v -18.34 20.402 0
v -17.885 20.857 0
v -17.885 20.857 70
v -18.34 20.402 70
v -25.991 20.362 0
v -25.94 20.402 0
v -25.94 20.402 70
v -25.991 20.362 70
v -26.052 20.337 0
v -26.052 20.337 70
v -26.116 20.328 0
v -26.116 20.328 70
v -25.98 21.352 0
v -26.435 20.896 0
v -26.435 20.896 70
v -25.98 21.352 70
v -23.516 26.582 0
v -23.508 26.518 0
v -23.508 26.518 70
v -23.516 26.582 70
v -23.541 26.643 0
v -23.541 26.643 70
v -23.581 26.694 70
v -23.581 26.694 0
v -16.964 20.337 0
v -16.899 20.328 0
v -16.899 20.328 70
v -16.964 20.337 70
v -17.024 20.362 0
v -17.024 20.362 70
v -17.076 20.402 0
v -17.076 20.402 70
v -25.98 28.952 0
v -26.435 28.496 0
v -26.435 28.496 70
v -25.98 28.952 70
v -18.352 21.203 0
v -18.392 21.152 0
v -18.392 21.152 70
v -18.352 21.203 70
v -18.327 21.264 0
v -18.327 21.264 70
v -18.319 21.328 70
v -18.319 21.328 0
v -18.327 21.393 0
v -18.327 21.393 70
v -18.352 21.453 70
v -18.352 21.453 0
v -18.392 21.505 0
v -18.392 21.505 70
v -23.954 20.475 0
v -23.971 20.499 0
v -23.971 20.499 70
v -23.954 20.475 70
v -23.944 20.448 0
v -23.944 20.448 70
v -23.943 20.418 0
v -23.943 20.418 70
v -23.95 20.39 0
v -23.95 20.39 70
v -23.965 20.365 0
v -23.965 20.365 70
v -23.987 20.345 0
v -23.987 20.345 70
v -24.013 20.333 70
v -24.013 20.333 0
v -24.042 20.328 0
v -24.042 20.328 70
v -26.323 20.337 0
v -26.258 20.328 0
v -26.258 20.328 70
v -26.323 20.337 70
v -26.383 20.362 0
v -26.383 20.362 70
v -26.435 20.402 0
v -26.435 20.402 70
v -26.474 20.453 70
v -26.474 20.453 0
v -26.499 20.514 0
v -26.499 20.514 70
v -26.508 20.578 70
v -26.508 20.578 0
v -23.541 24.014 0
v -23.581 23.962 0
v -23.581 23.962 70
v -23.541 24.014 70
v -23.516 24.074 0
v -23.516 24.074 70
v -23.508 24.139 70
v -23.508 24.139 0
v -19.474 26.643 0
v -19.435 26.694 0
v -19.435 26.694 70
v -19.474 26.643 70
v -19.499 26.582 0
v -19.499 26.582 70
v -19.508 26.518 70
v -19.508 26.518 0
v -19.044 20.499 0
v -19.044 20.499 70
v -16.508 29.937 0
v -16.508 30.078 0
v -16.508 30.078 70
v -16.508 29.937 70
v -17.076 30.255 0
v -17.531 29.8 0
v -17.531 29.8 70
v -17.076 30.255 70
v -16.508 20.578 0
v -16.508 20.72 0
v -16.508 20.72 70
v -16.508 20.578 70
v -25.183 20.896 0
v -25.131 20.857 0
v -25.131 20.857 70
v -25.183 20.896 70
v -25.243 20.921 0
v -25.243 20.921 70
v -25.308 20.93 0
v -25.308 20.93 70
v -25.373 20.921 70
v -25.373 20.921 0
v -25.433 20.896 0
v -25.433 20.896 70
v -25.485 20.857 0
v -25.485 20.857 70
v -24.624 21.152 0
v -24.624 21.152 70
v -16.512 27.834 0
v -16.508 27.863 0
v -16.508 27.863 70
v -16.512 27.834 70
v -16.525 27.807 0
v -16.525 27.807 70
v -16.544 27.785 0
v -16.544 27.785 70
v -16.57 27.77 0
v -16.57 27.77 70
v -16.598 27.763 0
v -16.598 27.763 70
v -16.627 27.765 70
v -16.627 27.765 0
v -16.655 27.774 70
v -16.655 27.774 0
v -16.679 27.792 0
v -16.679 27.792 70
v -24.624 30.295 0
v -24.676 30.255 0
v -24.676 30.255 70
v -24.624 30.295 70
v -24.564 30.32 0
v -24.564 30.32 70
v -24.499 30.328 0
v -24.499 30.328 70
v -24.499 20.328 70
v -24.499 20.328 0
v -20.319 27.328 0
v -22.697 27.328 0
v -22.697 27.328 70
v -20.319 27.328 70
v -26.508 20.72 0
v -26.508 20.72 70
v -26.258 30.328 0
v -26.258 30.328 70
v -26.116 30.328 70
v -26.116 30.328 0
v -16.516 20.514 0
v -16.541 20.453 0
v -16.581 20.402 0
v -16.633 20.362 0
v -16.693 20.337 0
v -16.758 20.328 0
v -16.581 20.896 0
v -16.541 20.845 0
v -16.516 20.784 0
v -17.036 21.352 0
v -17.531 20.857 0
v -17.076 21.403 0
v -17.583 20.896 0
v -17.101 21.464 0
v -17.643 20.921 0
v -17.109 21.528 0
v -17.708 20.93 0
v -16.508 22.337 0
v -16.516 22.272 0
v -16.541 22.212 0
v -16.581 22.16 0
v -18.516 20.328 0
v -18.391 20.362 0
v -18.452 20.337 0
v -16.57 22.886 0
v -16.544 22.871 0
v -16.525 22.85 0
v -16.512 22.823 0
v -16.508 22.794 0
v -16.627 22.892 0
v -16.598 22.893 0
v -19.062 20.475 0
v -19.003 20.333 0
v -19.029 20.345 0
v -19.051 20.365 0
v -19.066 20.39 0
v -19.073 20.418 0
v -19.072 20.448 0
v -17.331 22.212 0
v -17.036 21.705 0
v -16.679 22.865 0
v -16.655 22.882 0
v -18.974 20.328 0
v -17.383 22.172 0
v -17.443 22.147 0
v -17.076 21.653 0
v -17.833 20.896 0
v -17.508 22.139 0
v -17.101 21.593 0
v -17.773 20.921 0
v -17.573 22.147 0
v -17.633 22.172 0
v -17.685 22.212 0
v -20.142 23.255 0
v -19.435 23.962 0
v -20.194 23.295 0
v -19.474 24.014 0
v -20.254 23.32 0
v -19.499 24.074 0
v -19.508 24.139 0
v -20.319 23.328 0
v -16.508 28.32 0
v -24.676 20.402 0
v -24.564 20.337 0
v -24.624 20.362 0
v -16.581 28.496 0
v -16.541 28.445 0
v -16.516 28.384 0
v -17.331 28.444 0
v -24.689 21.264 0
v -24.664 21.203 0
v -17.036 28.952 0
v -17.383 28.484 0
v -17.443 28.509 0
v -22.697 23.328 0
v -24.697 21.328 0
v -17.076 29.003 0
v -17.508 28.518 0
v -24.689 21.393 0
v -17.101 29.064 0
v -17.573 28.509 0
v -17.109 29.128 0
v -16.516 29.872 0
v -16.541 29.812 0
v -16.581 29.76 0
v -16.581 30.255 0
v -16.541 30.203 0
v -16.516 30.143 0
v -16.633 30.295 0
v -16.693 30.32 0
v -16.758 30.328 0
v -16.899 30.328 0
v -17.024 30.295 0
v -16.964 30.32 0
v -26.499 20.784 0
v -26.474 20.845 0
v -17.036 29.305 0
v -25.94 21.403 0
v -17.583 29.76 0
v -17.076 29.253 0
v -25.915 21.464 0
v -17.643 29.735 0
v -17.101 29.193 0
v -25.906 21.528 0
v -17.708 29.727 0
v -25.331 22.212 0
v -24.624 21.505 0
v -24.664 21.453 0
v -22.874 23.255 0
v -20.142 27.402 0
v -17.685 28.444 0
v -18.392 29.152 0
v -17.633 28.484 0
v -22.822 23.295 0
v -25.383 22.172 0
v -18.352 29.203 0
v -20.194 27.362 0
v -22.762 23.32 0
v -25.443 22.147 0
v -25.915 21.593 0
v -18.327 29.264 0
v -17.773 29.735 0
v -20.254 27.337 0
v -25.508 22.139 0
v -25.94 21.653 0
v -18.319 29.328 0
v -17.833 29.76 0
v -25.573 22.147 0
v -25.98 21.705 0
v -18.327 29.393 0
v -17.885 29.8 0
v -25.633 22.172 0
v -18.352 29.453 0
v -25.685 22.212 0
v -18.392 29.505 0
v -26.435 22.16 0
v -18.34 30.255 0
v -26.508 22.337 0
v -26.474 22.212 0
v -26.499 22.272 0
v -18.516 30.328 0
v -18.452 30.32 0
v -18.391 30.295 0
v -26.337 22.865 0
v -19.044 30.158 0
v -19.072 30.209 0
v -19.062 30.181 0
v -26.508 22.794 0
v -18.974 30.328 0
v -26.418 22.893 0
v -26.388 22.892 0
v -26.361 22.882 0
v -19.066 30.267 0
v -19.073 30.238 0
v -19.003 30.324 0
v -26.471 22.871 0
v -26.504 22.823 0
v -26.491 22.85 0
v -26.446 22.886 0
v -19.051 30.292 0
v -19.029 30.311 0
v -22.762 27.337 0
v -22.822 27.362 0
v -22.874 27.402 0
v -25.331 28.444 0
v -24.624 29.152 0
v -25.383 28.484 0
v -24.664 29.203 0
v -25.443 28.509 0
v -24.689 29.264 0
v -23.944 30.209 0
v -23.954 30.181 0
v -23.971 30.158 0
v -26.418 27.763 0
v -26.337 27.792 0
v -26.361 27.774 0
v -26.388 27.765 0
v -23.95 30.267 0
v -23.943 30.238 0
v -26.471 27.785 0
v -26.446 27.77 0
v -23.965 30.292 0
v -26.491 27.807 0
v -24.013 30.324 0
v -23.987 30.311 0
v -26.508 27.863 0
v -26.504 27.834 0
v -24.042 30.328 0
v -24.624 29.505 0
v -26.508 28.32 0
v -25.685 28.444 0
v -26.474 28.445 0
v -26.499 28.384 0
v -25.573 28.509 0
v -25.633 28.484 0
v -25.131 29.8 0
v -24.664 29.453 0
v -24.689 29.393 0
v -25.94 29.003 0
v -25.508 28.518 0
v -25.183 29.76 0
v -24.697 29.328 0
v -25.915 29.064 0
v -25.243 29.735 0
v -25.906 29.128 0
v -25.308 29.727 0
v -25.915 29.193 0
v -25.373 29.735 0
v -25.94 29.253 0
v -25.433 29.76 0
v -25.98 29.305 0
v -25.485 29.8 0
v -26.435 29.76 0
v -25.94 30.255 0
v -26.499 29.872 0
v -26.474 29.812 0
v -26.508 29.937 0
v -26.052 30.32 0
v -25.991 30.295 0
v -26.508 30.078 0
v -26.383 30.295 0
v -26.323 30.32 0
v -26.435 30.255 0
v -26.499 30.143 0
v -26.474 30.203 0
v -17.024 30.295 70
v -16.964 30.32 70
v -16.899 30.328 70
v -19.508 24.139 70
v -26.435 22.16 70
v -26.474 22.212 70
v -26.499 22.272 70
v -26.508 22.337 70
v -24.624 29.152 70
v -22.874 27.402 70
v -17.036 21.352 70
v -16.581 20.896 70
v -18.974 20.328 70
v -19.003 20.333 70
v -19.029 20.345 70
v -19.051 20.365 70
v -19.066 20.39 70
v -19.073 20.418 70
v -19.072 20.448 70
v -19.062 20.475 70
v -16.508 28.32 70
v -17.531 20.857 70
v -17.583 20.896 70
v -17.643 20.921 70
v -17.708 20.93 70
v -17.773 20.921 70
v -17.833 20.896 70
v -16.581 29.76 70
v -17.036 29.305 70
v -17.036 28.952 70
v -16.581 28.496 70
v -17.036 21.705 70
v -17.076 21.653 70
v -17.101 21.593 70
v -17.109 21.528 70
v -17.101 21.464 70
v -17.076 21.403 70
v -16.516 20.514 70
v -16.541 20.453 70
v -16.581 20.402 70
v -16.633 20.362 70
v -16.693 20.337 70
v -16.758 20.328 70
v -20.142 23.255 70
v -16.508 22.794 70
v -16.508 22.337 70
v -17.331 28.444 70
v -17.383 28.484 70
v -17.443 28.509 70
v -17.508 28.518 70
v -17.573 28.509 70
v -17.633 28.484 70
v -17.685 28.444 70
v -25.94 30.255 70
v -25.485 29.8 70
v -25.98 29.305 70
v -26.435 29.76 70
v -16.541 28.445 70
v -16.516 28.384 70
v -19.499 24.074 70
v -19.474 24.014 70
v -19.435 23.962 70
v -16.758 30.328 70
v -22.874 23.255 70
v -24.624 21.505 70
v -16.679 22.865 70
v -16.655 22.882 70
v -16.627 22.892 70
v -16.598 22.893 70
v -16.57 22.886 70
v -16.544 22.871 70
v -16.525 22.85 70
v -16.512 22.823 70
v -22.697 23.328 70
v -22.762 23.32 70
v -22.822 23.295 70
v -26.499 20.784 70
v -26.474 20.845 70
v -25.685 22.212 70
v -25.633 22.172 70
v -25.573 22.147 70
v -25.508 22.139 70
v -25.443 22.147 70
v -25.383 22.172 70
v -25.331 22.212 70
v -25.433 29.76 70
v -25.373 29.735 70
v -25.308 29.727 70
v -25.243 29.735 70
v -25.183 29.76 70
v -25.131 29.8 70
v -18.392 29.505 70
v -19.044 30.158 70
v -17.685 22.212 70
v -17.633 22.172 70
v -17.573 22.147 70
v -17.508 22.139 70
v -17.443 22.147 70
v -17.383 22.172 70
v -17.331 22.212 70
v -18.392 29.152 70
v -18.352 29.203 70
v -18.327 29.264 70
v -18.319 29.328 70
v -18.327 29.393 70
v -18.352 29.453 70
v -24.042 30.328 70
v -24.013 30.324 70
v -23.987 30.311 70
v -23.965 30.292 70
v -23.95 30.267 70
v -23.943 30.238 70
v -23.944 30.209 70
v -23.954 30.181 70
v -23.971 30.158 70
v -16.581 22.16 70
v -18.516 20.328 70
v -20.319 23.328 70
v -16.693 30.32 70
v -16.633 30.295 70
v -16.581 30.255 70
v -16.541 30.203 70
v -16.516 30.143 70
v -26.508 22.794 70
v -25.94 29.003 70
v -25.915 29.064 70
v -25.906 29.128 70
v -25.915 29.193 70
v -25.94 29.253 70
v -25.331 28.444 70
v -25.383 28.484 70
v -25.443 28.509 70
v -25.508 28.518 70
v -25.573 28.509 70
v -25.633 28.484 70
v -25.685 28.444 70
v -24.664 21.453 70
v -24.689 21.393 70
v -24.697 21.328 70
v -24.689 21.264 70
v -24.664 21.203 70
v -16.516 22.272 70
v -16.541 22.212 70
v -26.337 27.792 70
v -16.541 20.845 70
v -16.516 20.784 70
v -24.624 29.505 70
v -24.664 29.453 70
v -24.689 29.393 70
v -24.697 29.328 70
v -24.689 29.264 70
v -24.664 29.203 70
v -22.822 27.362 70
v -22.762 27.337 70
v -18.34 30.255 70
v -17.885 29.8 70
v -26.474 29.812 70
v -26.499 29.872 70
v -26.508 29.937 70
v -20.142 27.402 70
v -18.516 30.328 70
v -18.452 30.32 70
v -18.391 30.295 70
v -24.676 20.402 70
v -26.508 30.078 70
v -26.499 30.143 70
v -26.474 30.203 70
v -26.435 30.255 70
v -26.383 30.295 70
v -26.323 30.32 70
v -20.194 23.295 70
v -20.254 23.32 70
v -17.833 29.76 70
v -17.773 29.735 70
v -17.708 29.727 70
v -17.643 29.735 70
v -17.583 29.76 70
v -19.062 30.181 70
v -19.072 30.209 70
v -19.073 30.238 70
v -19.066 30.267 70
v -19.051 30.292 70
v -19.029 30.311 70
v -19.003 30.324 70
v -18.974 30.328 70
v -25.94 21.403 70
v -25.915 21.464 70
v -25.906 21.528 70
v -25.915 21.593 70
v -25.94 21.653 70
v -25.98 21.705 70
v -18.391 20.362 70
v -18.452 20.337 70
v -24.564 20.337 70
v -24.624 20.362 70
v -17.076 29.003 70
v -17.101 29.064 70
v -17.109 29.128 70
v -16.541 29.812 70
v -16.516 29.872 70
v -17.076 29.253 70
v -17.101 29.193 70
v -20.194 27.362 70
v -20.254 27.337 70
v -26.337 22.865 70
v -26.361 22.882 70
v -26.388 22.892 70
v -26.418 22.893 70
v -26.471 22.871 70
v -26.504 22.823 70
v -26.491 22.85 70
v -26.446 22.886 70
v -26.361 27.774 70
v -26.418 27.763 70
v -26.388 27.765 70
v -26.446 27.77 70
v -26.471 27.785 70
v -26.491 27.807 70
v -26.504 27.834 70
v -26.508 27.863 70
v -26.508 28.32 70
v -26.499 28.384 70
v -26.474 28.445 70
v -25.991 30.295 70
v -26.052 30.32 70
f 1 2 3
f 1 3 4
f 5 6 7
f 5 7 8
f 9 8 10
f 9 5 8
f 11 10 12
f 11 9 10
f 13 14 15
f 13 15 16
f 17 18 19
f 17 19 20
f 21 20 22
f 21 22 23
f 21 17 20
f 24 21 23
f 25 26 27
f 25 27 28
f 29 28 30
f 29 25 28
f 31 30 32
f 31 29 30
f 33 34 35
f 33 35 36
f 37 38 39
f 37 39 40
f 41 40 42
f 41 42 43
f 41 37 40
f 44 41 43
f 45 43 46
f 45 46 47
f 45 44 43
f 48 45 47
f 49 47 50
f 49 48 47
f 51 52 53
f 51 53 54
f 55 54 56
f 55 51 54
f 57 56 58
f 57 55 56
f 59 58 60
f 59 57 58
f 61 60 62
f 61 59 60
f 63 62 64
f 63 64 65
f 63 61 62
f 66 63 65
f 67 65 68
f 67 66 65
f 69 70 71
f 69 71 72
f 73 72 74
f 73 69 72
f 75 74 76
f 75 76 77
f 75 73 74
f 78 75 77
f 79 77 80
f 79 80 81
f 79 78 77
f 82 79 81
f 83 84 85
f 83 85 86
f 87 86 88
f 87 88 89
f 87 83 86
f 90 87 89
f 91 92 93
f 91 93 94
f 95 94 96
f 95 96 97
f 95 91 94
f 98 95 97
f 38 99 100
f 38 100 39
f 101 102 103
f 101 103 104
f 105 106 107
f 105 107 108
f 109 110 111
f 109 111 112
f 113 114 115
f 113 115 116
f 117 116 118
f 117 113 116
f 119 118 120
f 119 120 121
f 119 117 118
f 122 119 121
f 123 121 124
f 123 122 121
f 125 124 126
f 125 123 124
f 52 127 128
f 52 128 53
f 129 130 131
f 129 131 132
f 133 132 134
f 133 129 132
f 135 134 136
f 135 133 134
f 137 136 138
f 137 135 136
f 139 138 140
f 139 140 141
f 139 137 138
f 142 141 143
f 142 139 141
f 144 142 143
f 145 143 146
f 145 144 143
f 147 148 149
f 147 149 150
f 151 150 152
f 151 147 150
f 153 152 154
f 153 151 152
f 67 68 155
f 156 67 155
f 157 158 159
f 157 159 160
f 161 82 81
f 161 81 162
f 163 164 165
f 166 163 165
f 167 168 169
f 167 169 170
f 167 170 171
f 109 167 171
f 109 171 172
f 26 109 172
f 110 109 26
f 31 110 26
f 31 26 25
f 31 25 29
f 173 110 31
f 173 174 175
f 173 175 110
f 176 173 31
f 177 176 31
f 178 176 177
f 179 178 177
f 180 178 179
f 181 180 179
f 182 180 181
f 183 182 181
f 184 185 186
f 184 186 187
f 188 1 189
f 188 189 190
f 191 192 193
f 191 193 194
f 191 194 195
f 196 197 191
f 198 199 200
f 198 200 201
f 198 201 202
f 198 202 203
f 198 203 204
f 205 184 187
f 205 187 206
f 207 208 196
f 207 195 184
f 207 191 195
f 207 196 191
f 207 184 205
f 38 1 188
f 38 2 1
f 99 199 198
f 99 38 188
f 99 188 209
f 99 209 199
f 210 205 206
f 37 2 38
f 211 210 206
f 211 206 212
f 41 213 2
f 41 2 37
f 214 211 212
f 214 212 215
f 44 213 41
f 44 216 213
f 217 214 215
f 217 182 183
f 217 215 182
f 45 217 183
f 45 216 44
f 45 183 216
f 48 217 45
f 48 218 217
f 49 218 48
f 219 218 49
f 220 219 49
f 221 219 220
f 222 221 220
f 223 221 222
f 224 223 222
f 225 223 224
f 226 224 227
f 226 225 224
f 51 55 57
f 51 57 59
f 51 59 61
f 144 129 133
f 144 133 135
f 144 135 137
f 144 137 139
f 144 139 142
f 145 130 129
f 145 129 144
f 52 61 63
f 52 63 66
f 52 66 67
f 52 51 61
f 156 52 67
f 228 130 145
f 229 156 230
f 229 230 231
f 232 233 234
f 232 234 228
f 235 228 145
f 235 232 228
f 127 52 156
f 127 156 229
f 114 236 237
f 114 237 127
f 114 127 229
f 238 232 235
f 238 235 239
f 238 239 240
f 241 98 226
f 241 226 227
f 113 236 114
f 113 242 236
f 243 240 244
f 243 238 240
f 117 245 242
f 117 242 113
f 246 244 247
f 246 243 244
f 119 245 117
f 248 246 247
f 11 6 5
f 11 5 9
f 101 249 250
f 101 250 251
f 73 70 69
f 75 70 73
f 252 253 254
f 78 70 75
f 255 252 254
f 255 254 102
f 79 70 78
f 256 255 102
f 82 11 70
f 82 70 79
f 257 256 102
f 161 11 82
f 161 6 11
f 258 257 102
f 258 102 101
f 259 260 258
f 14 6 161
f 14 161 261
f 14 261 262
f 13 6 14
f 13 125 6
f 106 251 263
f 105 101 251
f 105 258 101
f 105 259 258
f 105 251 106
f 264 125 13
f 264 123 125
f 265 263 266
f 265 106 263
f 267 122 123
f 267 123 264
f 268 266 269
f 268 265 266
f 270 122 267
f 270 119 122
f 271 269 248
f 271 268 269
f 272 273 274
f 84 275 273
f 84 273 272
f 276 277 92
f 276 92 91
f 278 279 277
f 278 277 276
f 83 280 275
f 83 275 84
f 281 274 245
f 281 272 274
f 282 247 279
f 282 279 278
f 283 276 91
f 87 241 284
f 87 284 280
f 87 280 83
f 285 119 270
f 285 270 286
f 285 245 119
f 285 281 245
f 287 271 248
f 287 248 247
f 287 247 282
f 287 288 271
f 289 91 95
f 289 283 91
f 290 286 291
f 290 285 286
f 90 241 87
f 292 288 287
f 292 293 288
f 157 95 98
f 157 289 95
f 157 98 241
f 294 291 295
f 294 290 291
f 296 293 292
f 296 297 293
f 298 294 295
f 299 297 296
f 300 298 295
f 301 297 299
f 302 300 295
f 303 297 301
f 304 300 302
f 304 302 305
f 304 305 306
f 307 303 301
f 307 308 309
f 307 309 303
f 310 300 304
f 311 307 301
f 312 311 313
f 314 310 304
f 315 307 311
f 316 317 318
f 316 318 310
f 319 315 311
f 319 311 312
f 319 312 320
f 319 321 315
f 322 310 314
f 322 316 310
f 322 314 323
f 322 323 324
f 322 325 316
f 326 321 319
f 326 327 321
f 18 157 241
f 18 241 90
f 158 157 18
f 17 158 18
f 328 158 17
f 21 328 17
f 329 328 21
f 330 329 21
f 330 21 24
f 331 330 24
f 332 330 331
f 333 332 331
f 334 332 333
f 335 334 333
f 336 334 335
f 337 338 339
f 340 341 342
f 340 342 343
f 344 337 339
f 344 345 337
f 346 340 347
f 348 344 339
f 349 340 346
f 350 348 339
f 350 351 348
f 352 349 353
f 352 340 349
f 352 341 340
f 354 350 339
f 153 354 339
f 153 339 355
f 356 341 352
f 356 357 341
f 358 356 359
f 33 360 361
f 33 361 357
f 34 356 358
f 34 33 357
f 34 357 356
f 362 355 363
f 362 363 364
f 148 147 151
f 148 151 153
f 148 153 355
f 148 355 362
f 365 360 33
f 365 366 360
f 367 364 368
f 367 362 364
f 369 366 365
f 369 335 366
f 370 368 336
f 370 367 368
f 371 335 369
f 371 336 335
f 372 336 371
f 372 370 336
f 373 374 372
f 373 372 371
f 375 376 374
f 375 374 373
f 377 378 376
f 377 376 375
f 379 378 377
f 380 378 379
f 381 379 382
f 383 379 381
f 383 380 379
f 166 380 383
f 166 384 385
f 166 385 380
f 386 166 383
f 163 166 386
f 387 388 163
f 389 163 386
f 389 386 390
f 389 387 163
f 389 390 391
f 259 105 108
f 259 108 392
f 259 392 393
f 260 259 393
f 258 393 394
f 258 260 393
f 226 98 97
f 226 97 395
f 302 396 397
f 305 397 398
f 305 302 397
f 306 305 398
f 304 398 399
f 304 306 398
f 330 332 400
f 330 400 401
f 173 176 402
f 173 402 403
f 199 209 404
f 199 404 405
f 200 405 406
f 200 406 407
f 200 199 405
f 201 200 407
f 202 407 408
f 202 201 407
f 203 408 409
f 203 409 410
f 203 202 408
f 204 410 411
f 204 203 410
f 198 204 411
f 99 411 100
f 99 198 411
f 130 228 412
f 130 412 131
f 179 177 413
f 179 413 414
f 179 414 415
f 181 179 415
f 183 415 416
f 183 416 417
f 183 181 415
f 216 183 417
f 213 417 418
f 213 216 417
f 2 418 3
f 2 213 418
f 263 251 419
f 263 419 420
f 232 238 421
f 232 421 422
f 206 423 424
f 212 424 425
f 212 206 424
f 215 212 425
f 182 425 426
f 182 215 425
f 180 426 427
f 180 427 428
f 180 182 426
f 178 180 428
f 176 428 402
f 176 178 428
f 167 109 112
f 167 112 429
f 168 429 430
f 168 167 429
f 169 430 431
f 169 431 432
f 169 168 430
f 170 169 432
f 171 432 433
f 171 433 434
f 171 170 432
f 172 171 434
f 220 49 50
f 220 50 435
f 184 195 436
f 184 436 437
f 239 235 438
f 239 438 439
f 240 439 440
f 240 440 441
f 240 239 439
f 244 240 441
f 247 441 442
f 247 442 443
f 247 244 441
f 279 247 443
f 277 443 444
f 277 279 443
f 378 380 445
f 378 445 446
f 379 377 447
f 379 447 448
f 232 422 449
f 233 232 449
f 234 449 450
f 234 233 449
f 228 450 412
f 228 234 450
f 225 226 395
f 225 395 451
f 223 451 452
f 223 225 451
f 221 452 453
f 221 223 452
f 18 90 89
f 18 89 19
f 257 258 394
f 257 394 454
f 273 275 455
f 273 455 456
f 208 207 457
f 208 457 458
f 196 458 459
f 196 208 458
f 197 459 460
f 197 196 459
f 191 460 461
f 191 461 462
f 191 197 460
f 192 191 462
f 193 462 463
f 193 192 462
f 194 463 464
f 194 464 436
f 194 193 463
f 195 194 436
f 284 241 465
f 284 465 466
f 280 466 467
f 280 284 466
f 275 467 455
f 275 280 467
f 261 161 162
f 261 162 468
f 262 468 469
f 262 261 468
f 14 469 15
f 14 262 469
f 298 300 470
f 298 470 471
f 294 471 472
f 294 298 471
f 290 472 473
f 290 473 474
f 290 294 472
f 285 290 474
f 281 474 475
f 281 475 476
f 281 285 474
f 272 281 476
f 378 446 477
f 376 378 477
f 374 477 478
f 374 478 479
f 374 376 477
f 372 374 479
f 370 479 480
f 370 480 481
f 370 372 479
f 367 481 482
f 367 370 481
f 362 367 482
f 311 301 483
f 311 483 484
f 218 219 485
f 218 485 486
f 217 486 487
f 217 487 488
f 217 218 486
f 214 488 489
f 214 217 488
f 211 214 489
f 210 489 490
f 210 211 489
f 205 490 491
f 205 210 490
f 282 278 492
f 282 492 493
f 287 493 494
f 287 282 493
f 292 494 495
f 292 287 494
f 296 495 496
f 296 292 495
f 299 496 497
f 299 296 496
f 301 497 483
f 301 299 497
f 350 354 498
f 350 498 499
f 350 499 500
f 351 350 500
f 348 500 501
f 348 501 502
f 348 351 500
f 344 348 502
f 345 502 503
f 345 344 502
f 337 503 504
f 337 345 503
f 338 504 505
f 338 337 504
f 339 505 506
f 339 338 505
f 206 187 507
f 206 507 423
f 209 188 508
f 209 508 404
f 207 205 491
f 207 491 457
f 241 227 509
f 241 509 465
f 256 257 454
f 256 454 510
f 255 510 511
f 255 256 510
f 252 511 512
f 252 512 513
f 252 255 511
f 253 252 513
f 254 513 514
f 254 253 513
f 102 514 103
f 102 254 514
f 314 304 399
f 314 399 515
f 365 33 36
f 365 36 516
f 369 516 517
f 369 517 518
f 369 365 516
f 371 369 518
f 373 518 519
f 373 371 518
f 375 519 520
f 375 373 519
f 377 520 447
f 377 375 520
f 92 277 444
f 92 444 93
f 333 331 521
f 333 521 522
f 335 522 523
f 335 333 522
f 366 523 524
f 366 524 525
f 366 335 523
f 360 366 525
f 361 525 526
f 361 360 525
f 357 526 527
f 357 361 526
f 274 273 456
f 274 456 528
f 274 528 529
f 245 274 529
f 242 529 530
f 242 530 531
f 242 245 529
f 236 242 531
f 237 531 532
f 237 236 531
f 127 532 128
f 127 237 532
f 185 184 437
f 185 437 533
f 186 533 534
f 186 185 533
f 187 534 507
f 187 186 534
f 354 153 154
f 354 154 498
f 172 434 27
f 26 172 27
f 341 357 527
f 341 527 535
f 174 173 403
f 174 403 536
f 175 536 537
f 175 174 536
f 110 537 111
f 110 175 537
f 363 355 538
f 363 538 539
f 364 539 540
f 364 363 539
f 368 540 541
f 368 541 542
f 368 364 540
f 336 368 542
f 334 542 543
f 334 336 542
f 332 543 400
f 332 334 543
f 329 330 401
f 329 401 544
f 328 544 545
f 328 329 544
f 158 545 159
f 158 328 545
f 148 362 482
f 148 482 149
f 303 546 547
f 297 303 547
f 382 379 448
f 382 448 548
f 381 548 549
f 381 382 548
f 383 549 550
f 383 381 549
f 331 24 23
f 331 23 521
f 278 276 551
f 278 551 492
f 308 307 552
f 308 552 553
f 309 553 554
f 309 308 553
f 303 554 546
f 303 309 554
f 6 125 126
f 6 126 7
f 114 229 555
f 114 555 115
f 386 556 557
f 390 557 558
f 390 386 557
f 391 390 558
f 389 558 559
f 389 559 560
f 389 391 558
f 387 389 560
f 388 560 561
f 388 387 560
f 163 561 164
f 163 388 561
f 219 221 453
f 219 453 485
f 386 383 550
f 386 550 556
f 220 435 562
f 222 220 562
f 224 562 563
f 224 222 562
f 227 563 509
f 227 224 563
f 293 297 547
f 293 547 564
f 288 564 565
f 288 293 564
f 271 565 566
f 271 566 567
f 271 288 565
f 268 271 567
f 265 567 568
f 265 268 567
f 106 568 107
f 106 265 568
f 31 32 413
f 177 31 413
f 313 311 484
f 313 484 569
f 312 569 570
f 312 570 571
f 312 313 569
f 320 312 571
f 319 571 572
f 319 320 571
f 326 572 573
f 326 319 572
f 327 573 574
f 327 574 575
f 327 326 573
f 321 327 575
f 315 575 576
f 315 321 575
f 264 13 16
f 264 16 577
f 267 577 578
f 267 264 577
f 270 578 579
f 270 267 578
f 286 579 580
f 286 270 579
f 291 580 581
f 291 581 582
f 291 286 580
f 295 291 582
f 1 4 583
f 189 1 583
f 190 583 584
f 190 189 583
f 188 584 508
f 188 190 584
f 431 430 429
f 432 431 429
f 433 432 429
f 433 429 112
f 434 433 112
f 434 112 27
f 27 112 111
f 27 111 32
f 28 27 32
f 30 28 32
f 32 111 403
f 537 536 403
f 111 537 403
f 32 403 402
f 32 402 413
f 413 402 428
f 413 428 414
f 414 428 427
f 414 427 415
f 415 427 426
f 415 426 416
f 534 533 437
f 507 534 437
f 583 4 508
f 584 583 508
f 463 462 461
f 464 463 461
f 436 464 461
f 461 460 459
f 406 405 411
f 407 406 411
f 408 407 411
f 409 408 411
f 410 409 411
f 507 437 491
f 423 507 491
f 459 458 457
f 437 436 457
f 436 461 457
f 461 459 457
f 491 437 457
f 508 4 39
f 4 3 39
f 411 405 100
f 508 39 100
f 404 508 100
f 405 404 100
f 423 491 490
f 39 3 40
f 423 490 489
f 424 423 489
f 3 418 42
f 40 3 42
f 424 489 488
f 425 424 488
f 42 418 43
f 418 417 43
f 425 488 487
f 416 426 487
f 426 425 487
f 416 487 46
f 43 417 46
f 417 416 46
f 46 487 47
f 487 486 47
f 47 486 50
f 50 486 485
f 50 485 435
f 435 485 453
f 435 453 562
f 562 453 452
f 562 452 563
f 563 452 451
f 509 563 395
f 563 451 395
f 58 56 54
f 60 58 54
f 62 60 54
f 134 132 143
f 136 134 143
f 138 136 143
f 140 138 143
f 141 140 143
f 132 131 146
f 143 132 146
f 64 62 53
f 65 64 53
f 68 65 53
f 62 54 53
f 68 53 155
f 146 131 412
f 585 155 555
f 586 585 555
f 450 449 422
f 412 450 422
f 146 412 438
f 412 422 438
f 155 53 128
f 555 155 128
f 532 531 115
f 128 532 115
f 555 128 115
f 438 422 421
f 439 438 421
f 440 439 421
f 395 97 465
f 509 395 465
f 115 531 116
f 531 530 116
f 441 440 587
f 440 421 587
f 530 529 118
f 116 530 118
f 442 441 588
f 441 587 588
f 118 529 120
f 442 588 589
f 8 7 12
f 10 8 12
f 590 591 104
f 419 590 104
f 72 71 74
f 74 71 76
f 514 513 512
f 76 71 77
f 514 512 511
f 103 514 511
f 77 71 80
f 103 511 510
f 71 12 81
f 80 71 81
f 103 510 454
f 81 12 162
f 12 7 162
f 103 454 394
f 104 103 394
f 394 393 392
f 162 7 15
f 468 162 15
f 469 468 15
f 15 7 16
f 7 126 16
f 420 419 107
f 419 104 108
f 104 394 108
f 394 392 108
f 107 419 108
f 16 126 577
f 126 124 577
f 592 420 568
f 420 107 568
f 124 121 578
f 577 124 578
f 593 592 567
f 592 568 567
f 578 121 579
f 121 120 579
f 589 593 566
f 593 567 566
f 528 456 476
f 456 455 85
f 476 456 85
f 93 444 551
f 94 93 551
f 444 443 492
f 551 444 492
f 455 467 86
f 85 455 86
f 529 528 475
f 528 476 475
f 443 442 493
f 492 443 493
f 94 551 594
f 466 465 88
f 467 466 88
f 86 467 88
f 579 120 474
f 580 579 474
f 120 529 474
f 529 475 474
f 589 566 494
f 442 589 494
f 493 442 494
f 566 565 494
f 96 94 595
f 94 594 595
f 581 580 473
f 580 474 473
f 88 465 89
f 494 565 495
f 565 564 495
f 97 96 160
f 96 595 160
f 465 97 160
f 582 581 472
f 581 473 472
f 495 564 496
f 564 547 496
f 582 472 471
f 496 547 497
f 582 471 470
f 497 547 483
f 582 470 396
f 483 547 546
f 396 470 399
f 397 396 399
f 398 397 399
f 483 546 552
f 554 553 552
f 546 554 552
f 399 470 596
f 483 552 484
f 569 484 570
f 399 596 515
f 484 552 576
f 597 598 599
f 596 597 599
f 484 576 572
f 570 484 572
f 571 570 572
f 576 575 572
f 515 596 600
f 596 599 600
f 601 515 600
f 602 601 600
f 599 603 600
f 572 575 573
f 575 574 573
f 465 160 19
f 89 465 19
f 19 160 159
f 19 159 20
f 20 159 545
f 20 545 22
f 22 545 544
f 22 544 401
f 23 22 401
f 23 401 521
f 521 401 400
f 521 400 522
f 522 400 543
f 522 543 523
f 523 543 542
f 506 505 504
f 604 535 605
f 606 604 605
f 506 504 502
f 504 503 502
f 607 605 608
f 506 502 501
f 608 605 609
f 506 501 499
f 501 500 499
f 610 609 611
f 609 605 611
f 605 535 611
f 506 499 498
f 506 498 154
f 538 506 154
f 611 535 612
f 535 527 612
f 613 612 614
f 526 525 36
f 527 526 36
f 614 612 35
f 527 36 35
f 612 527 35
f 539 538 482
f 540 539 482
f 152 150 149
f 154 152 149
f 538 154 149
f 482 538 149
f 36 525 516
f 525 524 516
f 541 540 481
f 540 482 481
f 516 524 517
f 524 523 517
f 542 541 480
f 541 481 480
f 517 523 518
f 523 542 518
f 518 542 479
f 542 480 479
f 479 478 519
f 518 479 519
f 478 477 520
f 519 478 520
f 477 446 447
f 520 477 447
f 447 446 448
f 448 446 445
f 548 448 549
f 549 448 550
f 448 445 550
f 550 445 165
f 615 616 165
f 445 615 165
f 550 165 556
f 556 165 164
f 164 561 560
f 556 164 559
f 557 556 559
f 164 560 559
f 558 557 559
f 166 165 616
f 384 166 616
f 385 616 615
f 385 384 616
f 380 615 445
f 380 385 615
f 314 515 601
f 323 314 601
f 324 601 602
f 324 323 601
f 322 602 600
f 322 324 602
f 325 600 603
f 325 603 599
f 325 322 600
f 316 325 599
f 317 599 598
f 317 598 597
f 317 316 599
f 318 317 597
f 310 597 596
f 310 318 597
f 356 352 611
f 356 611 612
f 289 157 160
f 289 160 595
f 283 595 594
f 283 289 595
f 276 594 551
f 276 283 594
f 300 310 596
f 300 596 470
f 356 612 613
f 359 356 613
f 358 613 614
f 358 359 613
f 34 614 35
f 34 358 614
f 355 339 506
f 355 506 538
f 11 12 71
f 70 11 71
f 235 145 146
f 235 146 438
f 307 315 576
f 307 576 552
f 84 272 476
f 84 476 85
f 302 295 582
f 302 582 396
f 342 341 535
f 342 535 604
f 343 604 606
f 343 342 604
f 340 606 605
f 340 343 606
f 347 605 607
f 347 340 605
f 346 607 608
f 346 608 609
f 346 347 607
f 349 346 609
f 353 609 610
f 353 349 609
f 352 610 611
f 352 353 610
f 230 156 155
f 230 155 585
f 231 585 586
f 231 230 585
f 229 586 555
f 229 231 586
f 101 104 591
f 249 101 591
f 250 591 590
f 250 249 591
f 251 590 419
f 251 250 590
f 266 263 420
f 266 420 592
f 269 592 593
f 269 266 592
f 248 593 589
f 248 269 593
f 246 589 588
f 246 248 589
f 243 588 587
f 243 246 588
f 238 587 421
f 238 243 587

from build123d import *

# Parameters (mm, degrees)
BOSS_EXTRUDE1_DEPTH = 70


with BuildPart() as part:
    # Sketch1 → Boss-Extrude1 (new body)
    with BuildSketch(Plane.XY):
        with BuildLine():
            Line((-26.434620061, 28.496491655), (-25.979594809, 28.951516907))
            ThreePointArc((-25.979594809, 28.951516907), (-25.906371503, 29.128293603), (-25.979594808, 29.305070299))
            Line((-25.979594808, 29.305070299), (-26.43462006, 29.760095551))
            ThreePointArc((-26.43462006, 29.760095551), (-26.488813248, 29.841201388), (-26.507843365, 29.936872247))
            Line((-26.507843365, 29.936872247), (-26.507843365, 30.078293605))
            ThreePointArc((-26.507843365, 30.078293605), (-26.43462006, 30.255070299), (-26.257843366, 30.328293604))
            Line((-26.257843366, 30.328293604), (-26.11642201, 30.328293604))
            ThreePointArc((-26.11642201, 30.328293604), (-26.020751153, 30.309263487), (-25.939645316, 30.255070299))
            Line((-25.939645316, 30.255070299), (-25.484620061, 29.800045045))
            ThreePointArc((-25.484620061, 29.800045045), (-25.307843366, 29.72682174), (-25.131066671, 29.800045045))
            Line((-25.131066671, 29.800045045), (-24.676041418, 30.255070298))
            ThreePointArc((-24.676041418, 30.255070298), (-24.594935581, 30.309263487), (-24.499264722, 30.328293604))
            Line((-24.499264722, 30.328293604), (-24.042157942, 30.328293604))
            ThreePointArc((-24.042157942, 30.328293604), (-23.949769989, 30.266561947), (-23.971447265, 30.157582926))
            Line((-23.971447265, 30.157582926), (-24.623959891, 29.505070299))
            ThreePointArc((-24.623959891, 29.505070299), (-24.697183196, 29.328293604), (-24.623959891, 29.15151691))
            Line((-24.623959891, 29.15151691), (-22.873959891, 27.401516909))
            ThreePointArc((-22.873959891, 27.401516909), (-22.792854054, 27.347323722), (-22.697183196, 27.328293605))
            Line((-22.697183196, 27.328293605), (-20.318503539, 27.328293605))
            ThreePointArc((-20.318503539, 27.328293605), (-20.222832681, 27.347323722), (-20.141726844, 27.401516909))
            Line((-20.141726844, 27.401516909), (-18.391726844, 29.15151691))
            ThreePointArc((-18.391726844, 29.15151691), (-18.318503539, 29.328293604), (-18.391726844, 29.505070299))
            Line((-18.391726844, 29.505070299), (-19.04423947, 30.157582926))
            ThreePointArc((-19.04423947, 30.157582926), (-19.065916745, 30.266561947), (-18.973528793, 30.328293604))
            Line((-18.973528793, 30.328293604), (-18.516422013, 30.328293604))
            ThreePointArc((-18.516422013, 30.328293604), (-18.420751155, 30.309263487), (-18.339645319, 30.2550703))
            Line((-18.339645319, 30.2550703), (-17.884620064, 29.800045045))
            ThreePointArc((-17.884620064, 29.800045045), (-17.707843369, 29.72682174), (-17.531066674, 29.800045045))
            Line((-17.531066674, 29.800045045), (-17.07604142, 30.2550703))
            ThreePointArc((-17.07604142, 30.2550703), (-16.994935583, 30.309263487), (-16.899264725, 30.328293604))
            Line((-16.899264725, 30.328293604), (-16.75784337, 30.328293604))
            ThreePointArc((-16.75784337, 30.328293604), (-16.581066675, 30.255070299), (-16.507843371, 30.078293605))
            Line((-16.507843371, 30.078293605), (-16.507843371, 29.936872247))
            ThreePointArc((-16.507843371, 29.936872247), (-16.526873488, 29.841201389), (-16.581066675, 29.760095552))
            Line((-16.581066675, 29.760095552), (-17.036091927, 29.3050703))
            ThreePointArc((-17.036091927, 29.3050703), (-17.109315232, 29.128293603), (-17.036091926, 28.951516907))
            Line((-17.036091926, 28.951516907), (-16.581066674, 28.496491655))
            ThreePointArc((-16.581066674, 28.496491655), (-16.526873486, 28.415385818), (-16.507843369, 28.31971496))
            Line((-16.507843369, 28.31971496), (-16.507843369, 27.862608178))
            ThreePointArc((-16.507843369, 27.862608178), (-16.569575025, 27.770220231), (-16.678554041, 27.791897499))
            Line((-16.678554041, 27.791897499), (-17.331066668, 28.444410126))
            ThreePointArc((-17.331066668, 28.444410126), (-17.507843364, 28.517633431), (-17.68462006, 28.444410125))
            Line((-17.68462006, 28.444410125), (-19.434620061, 26.694410125))
            ThreePointArc((-19.434620061, 26.694410125), (-19.488813248, 26.613304288), (-19.507843364, 26.51763343))
            Line((-19.507843364, 26.51763343), (-19.507843364, 24.138953775))
            ThreePointArc((-19.507843364, 24.138953775), (-19.488813247, 24.043282917), (-19.434620059, 23.962177079))
            Line((-19.434620059, 23.962177079), (-17.684620059, 22.212177079))
            ThreePointArc((-17.684620059, 22.212177079), (-17.507843363, 22.138953773), (-17.331066666, 22.212177077))
            Line((-17.331066666, 22.212177077), (-16.67855404, 22.864689704))
            ThreePointArc((-16.67855404, 22.864689704), (-16.569575019, 22.886366979), (-16.507843363, 22.793979027))
            Line((-16.507843363, 22.793979027), (-16.507843363, 22.336872245))
            ThreePointArc((-16.507843363, 22.336872245), (-16.52687348, 22.241201387), (-16.581066668, 22.16009555))
            Line((-16.581066668, 22.16009555), (-17.036091921, 21.705070296))
            ThreePointArc((-17.036091921, 21.705070296), (-17.109315225, 21.528293601), (-17.036091921, 21.351516906))
            Line((-17.036091921, 21.351516906), (-16.581066669, 20.896491654))
            ThreePointArc((-16.581066669, 20.896491654), (-16.526873481, 20.815385817), (-16.507843364, 20.719714959))
            Line((-16.507843364, 20.719714959), (-16.507843364, 20.578293601))
            ThreePointArc((-16.507843364, 20.578293601), (-16.581066669, 20.401516906), (-16.757843364, 20.328293601))
            Line((-16.757843364, 20.328293601), (-16.89926472, 20.328293601))
            ThreePointArc((-16.89926472, 20.328293601), (-16.994935578, 20.347323718), (-17.076041415, 20.401516905))
            Line((-17.076041415, 20.401516905), (-17.53106667, 20.85654216))
            ThreePointArc((-17.53106667, 20.85654216), (-17.707843365, 20.929765464), (-17.88462006, 20.85654216))
            Line((-17.88462006, 20.85654216), (-18.339645314, 20.401516905))
            ThreePointArc((-18.339645314, 20.401516905), (-18.420751151, 20.347323718), (-18.516422009, 20.328293601))
            Line((-18.516422009, 20.328293601), (-18.973528789, 20.328293601))
            ThreePointArc((-18.973528789, 20.328293601), (-19.065916743, 20.390025258), (-19.044239468, 20.499004281))
            Line((-19.044239468, 20.499004281), (-18.391726841, 21.151516907))
            ThreePointArc((-18.391726841, 21.151516907), (-18.318503536, 21.328293602), (-18.391726841, 21.505070297))
            Line((-18.391726841, 21.505070297), (-20.141726841, 23.255070297))
            ThreePointArc((-20.141726841, 23.255070297), (-20.222832678, 23.309263485), (-20.318503536, 23.328293602))
            Line((-20.318503536, 23.328293602), (-22.697183193, 23.328293602))
            ThreePointArc((-22.697183193, 23.328293602), (-22.792854051, 23.309263485), (-22.873959889, 23.255070297))
            Line((-22.873959889, 23.255070297), (-24.623959889, 21.505070297))
            ThreePointArc((-24.623959889, 21.505070297), (-24.697183193, 21.328293602), (-24.623959889, 21.151516907))
            Line((-24.623959889, 21.151516907), (-23.971447262, 20.499004281))
            ThreePointArc((-23.971447262, 20.499004281), (-23.949769986, 20.390025258), (-24.042157941, 20.328293601))
            Line((-24.042157941, 20.328293601), (-24.49926472, 20.328293601))
            ThreePointArc((-24.49926472, 20.328293601), (-24.594935579, 20.347323718), (-24.676041417, 20.401516907))
            Line((-24.676041417, 20.401516907), (-25.131066671, 20.85654216))
            ThreePointArc((-25.131066671, 20.85654216), (-25.307843365, 20.929765464), (-25.48462006, 20.85654216))
            Line((-25.48462006, 20.85654216), (-25.939645315, 20.401516906))
            ThreePointArc((-25.939645315, 20.401516906), (-26.020751152, 20.347323718), (-26.11642201, 20.328293601))
            Line((-26.11642201, 20.328293601), (-26.257843366, 20.328293601))
            ThreePointArc((-26.257843366, 20.328293601), (-26.434620061, 20.401516906), (-26.507843366, 20.578293601))
            Line((-26.507843366, 20.578293601), (-26.507843366, 20.719714959))
            ThreePointArc((-26.507843366, 20.719714959), (-26.488813249, 20.815385817), (-26.434620061, 20.896491655))
            Line((-26.434620061, 20.896491655), (-25.979594809, 21.351516907))
            ThreePointArc((-25.979594809, 21.351516907), (-25.906371505, 21.528293602), (-25.979594809, 21.705070297))
            Line((-25.979594809, 21.705070297), (-26.434620063, 22.16009555))
            ThreePointArc((-26.434620063, 22.16009555), (-26.48881325, 22.241201387), (-26.507843367, 22.336872245))
            Line((-26.507843367, 22.336872245), (-26.507843367, 22.793979027))
            ThreePointArc((-26.507843367, 22.793979027), (-26.446111711, 22.88636698), (-26.337132691, 22.864689705))
            Line((-26.337132691, 22.864689705), (-25.684620064, 22.212177078))
            ThreePointArc((-25.684620064, 22.212177078), (-25.507843369, 22.138953774), (-25.331066674, 22.212177078))
            Line((-25.331066674, 22.212177078), (-23.581066674, 23.962177078))
            ThreePointArc((-23.581066674, 23.962177078), (-23.526873485, 24.043282916), (-23.507843368, 24.138953775))
            Line((-23.507843368, 24.138953775), (-23.507843368, 26.51763343))
            ThreePointArc((-23.507843368, 26.51763343), (-23.526873484, 26.613304288), (-23.581066672, 26.694410125))
            Line((-23.581066672, 26.694410125), (-25.331066672, 28.444410125))
            ThreePointArc((-25.331066672, 28.444410125), (-25.507843367, 28.51763343), (-25.684620062, 28.444410125))
            Line((-25.684620062, 28.444410125), (-26.337132689, 27.791897498))
            ThreePointArc((-26.337132689, 27.791897498), (-26.44611171, 27.770220225), (-26.507843366, 27.862608178))
            Line((-26.507843366, 27.862608178), (-26.507843366, 28.31971496))
            ThreePointArc((-26.507843366, 28.31971496), (-26.488813249, 28.415385818), (-26.434620061, 28.496491655))
        make_face()
    extrude(amount=BOSS_EXTRUDE1_DEPTH)


solid = part.part
